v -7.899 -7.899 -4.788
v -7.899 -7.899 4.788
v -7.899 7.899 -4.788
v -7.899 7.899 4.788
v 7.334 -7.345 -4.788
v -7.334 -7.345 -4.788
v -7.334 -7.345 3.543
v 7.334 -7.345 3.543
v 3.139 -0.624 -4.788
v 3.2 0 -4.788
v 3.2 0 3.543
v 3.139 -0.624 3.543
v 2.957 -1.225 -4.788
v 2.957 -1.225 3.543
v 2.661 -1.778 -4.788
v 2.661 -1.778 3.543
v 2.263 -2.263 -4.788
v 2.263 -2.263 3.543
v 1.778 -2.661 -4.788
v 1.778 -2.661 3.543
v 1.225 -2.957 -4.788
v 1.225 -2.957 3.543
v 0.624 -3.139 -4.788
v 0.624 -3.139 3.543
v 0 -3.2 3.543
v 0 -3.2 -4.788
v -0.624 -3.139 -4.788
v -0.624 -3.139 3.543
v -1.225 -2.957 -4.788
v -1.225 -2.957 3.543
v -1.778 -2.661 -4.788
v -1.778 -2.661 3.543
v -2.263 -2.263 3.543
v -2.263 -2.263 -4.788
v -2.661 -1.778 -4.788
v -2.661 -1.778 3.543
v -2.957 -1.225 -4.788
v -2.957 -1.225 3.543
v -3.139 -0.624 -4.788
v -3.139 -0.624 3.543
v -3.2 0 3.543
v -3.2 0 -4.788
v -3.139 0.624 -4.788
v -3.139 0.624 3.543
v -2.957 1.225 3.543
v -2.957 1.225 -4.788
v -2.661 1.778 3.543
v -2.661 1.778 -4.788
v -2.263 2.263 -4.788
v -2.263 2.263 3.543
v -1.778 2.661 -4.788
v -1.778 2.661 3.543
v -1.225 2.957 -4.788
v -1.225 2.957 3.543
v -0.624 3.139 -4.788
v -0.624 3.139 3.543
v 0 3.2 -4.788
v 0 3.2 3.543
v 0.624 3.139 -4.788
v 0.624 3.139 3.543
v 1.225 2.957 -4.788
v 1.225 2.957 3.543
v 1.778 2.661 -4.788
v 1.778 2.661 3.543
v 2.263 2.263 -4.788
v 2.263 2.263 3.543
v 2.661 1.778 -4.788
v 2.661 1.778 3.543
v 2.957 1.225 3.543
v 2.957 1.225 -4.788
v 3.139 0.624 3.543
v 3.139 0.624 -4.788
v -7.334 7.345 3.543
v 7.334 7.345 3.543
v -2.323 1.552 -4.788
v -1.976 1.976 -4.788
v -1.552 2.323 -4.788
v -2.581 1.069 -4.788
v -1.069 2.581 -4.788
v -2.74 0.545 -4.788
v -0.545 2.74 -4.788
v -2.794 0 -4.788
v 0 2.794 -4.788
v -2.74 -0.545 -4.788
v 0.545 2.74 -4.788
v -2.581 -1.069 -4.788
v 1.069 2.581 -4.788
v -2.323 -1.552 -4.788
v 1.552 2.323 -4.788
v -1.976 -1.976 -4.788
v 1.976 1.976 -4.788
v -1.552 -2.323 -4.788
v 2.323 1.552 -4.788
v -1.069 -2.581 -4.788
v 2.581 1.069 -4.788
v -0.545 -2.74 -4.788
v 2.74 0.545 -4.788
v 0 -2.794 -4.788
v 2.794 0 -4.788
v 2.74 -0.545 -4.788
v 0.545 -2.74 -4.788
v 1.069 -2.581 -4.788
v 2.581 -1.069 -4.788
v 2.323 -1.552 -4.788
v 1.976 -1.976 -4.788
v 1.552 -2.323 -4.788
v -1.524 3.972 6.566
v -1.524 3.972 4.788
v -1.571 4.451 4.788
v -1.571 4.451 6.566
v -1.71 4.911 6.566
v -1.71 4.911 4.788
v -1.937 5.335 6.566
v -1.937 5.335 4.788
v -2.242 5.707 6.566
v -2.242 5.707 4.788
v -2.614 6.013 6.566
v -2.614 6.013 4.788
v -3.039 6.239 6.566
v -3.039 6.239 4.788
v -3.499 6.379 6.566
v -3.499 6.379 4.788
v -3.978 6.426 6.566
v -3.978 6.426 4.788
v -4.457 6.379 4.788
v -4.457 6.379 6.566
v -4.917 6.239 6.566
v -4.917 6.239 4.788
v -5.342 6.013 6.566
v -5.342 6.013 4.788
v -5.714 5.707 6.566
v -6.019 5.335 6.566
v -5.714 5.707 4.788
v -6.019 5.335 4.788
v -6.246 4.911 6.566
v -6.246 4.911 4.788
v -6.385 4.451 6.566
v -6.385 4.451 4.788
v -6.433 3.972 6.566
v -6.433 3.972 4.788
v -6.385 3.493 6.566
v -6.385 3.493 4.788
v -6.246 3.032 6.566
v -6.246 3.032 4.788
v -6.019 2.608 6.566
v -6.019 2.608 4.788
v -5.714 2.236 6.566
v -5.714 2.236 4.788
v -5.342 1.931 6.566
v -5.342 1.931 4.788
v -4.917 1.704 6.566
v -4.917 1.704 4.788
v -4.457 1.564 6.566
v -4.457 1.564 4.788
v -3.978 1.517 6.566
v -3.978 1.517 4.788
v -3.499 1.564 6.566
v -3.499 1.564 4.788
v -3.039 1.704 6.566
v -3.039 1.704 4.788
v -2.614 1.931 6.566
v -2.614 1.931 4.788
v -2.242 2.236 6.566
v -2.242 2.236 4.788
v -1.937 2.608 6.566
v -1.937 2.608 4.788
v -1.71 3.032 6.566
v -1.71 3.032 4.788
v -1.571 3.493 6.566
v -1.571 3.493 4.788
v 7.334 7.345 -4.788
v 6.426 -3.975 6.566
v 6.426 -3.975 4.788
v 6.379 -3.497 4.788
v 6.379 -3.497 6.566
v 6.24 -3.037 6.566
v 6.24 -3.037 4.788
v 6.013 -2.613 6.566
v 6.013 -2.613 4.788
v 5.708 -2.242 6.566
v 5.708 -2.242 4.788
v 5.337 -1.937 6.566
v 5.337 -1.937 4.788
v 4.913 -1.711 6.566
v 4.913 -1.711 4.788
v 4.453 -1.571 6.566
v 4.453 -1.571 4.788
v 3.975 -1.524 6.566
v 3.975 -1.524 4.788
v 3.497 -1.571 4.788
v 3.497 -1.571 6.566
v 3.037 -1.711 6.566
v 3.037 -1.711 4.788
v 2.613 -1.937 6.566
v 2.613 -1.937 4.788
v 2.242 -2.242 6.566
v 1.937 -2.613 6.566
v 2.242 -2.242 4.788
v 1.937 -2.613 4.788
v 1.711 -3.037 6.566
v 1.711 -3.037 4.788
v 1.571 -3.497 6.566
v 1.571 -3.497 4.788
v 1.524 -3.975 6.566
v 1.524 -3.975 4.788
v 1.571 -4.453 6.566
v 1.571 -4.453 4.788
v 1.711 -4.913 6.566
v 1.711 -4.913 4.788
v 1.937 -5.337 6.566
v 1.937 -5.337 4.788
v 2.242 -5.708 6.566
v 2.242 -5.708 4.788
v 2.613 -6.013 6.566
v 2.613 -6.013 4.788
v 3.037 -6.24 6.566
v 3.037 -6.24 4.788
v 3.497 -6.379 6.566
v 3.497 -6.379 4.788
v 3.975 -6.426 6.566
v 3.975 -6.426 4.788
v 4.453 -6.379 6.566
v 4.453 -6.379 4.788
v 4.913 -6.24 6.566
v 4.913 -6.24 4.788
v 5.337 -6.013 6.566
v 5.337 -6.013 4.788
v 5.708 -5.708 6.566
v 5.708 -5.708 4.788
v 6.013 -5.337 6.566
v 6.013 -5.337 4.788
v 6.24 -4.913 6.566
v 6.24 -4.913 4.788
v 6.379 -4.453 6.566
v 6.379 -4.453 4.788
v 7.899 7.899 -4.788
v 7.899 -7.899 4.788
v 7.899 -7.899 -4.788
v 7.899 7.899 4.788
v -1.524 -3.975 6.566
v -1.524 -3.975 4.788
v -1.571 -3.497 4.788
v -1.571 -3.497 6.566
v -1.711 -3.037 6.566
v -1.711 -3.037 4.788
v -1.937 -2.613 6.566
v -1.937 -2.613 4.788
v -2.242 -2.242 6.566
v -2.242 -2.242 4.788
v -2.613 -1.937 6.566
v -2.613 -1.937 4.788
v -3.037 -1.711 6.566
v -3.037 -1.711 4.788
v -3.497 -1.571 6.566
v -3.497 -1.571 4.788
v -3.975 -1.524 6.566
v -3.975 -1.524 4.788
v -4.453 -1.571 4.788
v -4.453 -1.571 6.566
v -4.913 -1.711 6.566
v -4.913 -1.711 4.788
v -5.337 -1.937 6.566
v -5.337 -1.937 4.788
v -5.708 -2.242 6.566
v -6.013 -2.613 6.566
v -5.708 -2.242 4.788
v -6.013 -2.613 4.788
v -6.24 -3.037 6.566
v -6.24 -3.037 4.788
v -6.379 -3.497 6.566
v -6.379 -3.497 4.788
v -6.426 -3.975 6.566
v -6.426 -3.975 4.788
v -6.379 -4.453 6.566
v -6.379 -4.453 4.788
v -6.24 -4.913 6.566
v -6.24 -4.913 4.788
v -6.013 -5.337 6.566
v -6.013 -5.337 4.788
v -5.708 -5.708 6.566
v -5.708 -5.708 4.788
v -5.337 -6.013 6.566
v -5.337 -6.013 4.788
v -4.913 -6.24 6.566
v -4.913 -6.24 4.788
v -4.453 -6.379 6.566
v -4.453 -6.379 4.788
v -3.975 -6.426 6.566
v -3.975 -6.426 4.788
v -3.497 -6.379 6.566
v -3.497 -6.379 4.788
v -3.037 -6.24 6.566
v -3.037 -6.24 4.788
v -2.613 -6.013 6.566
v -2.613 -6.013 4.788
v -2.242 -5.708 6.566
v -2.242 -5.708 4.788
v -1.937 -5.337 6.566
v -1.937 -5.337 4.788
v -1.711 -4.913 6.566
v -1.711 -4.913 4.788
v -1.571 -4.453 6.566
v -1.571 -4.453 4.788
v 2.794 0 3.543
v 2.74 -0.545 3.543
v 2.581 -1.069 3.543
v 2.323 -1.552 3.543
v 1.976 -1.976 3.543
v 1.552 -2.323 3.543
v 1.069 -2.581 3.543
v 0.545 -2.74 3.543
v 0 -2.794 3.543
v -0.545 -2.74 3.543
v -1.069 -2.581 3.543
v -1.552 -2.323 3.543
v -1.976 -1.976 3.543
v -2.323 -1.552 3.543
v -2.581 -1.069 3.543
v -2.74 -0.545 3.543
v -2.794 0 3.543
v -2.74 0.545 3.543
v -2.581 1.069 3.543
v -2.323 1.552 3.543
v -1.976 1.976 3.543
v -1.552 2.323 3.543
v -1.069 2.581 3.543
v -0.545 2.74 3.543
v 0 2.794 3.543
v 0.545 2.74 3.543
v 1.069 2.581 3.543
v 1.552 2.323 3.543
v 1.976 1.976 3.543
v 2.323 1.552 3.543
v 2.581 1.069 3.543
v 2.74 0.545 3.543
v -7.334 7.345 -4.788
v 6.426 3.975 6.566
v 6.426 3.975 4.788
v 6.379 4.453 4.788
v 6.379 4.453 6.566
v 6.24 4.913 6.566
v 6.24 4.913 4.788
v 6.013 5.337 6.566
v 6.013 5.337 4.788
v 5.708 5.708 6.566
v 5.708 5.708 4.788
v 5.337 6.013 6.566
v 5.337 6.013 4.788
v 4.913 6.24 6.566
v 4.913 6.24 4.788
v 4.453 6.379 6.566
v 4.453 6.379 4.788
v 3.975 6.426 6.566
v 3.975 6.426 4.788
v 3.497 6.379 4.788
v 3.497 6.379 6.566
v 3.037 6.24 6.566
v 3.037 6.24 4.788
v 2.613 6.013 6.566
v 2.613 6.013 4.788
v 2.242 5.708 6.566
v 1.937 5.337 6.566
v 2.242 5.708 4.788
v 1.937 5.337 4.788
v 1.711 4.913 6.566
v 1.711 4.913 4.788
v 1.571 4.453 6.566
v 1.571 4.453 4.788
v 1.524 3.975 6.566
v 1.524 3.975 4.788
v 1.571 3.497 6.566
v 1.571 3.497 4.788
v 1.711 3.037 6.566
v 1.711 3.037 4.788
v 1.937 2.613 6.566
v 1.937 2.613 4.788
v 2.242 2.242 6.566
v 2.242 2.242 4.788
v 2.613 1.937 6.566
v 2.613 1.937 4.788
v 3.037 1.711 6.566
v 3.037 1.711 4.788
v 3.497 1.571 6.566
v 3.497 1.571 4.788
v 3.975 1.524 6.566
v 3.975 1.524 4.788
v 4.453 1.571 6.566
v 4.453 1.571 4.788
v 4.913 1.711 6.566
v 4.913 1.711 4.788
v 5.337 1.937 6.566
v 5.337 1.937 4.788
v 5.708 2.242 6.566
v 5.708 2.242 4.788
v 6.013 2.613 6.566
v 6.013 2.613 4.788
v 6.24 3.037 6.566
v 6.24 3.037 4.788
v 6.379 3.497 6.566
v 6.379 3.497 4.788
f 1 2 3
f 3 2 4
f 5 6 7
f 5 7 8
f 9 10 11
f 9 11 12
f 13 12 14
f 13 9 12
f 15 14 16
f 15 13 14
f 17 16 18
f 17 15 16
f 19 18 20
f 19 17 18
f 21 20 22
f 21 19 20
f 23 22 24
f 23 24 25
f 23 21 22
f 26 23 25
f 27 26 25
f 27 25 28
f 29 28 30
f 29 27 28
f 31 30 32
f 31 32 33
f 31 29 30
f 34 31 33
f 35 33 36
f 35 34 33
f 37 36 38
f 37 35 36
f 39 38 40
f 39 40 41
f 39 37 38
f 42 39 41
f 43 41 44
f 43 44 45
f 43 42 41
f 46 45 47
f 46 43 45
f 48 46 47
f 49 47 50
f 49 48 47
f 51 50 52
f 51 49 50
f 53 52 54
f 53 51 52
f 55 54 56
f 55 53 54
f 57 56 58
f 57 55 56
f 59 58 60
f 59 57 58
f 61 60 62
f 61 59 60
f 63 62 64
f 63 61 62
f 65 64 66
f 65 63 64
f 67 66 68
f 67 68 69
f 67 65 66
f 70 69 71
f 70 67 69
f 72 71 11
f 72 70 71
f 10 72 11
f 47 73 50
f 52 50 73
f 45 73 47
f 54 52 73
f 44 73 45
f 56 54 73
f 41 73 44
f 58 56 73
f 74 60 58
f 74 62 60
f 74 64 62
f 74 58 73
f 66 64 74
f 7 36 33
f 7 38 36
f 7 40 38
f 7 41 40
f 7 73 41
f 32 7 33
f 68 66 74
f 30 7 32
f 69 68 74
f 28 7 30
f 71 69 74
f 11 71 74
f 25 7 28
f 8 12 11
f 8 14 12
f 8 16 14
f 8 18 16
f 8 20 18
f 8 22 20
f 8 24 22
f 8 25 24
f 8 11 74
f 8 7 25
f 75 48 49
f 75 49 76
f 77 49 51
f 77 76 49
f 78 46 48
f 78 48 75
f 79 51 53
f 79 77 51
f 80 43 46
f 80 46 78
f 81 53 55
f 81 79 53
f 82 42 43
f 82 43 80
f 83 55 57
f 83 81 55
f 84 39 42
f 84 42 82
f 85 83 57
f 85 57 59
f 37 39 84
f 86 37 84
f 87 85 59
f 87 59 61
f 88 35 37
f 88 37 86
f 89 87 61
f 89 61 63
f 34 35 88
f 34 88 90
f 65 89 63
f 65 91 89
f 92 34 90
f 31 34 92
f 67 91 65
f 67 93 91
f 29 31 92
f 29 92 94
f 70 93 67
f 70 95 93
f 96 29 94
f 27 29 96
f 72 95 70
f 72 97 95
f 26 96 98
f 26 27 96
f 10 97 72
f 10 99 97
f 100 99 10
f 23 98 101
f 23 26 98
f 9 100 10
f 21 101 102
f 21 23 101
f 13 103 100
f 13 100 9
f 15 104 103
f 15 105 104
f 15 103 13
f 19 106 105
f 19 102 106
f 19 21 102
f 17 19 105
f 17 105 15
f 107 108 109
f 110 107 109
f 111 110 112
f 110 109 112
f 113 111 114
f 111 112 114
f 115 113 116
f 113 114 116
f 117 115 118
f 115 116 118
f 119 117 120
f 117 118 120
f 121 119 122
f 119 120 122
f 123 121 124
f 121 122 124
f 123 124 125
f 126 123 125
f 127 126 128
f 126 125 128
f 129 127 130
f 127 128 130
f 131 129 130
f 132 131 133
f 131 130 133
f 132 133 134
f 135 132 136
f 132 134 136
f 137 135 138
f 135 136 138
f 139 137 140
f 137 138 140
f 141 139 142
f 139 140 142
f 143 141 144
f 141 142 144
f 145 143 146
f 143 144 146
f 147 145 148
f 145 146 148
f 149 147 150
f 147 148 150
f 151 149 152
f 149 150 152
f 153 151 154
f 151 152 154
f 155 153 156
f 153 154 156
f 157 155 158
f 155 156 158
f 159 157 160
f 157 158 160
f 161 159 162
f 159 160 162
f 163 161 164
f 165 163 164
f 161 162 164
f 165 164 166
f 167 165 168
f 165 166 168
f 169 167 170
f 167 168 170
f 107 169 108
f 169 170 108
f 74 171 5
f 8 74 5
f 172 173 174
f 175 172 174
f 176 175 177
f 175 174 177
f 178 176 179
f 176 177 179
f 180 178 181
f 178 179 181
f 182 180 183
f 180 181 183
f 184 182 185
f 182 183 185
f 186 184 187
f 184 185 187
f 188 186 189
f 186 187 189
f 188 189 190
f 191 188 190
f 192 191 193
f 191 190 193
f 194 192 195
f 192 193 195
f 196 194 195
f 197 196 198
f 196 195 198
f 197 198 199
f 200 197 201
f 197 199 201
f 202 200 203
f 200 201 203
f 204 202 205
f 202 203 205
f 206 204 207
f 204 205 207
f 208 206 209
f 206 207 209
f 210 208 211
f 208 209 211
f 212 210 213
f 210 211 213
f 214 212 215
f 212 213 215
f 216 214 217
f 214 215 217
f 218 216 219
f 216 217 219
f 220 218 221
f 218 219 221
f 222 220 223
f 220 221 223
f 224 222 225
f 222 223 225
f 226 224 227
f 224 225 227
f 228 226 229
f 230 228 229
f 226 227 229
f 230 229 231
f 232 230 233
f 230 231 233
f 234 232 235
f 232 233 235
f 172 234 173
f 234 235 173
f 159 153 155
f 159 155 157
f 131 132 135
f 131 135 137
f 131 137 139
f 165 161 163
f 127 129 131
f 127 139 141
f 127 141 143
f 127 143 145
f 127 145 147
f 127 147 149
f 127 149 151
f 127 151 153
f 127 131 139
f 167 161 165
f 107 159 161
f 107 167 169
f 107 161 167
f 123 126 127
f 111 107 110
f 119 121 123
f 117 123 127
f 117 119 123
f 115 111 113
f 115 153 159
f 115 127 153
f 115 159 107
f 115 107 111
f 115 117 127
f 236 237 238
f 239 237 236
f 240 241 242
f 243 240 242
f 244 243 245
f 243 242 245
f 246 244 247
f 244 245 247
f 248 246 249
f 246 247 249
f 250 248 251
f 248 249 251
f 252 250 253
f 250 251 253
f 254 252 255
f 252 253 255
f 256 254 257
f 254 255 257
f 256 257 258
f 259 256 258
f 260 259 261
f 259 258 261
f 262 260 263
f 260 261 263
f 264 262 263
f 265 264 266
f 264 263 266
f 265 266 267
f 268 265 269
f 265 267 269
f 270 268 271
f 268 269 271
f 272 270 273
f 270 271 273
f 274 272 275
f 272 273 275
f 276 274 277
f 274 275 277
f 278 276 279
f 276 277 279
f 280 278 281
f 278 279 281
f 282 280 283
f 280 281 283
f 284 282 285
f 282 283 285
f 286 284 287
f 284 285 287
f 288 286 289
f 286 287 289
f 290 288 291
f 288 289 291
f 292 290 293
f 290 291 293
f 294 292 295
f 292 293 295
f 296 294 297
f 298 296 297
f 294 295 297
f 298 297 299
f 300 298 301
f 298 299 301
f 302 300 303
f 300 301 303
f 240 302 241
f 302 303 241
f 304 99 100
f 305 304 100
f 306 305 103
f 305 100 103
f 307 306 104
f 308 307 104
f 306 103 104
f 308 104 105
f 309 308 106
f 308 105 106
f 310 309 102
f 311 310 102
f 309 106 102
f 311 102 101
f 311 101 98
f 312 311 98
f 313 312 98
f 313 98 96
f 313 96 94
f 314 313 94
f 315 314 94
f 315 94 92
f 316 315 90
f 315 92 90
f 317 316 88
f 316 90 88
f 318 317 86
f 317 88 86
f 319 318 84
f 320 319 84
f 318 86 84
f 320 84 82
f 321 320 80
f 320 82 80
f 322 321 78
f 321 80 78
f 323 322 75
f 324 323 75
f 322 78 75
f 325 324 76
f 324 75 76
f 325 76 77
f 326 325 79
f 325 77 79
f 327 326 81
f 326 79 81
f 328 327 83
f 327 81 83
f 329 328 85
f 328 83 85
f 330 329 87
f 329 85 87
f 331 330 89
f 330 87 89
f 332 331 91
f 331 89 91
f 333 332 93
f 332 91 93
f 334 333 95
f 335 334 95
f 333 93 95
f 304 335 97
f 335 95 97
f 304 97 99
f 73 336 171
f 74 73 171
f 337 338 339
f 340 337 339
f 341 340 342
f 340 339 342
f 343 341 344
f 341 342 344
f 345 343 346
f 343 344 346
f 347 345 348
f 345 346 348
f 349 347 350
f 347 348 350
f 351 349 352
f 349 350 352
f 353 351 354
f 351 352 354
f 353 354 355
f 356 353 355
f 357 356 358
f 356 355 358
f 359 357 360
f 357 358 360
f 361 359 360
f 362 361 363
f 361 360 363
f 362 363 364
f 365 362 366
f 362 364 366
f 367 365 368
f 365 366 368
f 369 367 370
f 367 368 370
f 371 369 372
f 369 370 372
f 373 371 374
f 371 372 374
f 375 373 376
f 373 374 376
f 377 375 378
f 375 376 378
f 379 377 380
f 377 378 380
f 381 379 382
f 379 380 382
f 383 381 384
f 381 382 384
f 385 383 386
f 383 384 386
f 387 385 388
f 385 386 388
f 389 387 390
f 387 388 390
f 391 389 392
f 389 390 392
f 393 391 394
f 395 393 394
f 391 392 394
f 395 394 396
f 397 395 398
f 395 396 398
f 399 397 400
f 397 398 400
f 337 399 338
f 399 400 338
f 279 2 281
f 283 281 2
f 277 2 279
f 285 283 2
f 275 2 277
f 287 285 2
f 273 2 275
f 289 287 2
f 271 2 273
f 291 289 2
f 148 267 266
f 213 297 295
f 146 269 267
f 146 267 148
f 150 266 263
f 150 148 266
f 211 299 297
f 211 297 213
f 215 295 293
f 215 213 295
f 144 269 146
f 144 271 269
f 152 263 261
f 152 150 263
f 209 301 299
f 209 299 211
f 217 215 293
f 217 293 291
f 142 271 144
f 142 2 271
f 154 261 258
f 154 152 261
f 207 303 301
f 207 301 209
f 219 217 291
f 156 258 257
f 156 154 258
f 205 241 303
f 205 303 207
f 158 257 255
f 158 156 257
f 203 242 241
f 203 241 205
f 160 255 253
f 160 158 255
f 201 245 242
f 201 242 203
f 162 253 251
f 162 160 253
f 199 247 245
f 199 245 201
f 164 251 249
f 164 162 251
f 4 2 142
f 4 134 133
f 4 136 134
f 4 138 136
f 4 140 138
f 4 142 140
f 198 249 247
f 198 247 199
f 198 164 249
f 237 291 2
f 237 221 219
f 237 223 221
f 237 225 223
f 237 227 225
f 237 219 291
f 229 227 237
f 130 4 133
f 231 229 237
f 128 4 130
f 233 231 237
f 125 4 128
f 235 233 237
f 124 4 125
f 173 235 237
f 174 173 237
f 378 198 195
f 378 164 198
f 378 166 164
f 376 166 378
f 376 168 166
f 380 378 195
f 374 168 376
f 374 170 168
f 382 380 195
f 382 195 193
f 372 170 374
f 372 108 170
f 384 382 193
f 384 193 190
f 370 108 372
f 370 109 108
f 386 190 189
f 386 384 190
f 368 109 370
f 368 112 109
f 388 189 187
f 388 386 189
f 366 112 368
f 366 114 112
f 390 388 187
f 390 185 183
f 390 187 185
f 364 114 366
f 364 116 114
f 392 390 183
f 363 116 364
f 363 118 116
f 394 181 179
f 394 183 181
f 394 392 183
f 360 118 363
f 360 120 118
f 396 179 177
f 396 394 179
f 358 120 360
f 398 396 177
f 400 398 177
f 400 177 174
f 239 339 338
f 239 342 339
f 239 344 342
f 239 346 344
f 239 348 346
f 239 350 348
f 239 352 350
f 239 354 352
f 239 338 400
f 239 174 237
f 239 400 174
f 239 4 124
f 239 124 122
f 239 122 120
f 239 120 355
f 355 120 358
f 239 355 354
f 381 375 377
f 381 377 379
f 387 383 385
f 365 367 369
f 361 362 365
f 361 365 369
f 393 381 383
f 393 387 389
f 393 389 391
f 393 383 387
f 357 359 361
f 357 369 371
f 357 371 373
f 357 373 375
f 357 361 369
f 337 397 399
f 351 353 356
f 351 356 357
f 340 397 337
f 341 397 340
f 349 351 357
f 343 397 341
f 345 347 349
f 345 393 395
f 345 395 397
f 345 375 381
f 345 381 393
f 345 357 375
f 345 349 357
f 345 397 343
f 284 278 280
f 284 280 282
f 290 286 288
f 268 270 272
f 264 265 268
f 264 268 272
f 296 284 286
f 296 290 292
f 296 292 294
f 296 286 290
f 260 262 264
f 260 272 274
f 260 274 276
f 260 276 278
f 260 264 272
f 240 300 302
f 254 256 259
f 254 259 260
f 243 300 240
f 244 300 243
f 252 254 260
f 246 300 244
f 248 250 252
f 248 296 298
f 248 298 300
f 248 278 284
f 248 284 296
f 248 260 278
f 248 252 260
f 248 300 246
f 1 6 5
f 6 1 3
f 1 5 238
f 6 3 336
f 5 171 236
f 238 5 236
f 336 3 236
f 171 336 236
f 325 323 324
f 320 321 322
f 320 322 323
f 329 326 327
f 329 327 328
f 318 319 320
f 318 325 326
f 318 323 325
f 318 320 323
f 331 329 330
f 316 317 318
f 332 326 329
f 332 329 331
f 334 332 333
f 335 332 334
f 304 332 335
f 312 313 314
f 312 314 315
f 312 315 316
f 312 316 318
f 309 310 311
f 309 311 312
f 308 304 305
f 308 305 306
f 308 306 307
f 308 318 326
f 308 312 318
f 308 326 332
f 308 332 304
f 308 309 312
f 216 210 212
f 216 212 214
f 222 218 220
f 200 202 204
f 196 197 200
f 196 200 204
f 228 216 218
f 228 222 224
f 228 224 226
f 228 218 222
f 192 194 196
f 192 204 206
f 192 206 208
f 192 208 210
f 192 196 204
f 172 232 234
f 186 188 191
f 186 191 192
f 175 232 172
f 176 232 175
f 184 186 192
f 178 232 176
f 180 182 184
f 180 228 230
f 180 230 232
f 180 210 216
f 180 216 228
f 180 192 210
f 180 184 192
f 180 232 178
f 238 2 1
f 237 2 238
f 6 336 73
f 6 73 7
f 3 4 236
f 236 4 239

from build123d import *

# Parameters (mm, degrees)
F0_W      = 15.7988
F0_H      = 15.7988
F1_DEPTH  = 4.7879
F2_R      = 2.454504
F6_DEPTH  = 1.778
F3_R      = 2.4511
F7_DEPTH  = 1.778
F4_R      = 2.4511
F8_DEPTH  = 1.778
F5_R      = 2.4511
F9_DEPTH  = 1.778
F10_W     = 14.667356
F10_H     = 14.690364
F13_DEPTH = 8.3312
F11_R     = 3.2004
F14_DEPTH = 8.3312
F12_R     = 2.794
F15_DEPTH = 8.3312


with BuildPart() as f1:
    # F0 (on Top) → F1 (new body, symmetric)
    with BuildSketch(Plane.XY):
        Rectangle(F0_W, F0_H)
    extrude(amount=F1_DEPTH, both=True)

    # F2 (on face) → F6 (join)
    with BuildSketch(Plane.XY.offset(4.7879)):
        with Locations((-3.978046, 3.971696)):
            Circle(F2_R)
    extrude(amount=F6_DEPTH)

    # F3 (on face) → F7 (join)
    with BuildSketch(Plane.XY.offset(4.7879)):
        with Locations((3.9751, 3.9751)):
            Circle(F3_R)
    extrude(amount=F7_DEPTH)

    # F4 (on face) → F8 (join)
    with BuildSketch(Plane.XY.offset(4.7879)):
        with Locations((-3.9751, -3.9751)):
            Circle(F4_R)
    extrude(amount=F8_DEPTH)

    # F5 (on face) → F9 (join)
    with BuildSketch(Plane.XY.offset(4.7879)):
        with Locations((3.9751, -3.9751)):
            Circle(F5_R)
    extrude(amount=F9_DEPTH)

    # F10 (on face) → F13 (cut)
    with BuildSketch(Plane(origin=(0, 0, -4.7879), x_dir=(1, 0, 0), z_dir=(0, 0, -1))):
        Rectangle(F10_W, F10_H)
    extrude(amount=-F13_DEPTH, mode=Mode.SUBTRACT)

    # F11 (on face) → F14 (join)
    with BuildSketch(Plane(origin=(0, 0, -4.7879), x_dir=(1, 0, 0), z_dir=(0, 0, -1))):
        Circle(F11_R)
    extrude(amount=-F14_DEPTH)

    # F12 (on face) → F15 (cut)
    with BuildSketch(Plane(origin=(0, 0, -4.7879), x_dir=(1, 0, 0), z_dir=(0, 0, -1))):
        Circle(F12_R)
    extrude(amount=-F15_DEPTH, mode=Mode.SUBTRACT)


solid = f1.part
